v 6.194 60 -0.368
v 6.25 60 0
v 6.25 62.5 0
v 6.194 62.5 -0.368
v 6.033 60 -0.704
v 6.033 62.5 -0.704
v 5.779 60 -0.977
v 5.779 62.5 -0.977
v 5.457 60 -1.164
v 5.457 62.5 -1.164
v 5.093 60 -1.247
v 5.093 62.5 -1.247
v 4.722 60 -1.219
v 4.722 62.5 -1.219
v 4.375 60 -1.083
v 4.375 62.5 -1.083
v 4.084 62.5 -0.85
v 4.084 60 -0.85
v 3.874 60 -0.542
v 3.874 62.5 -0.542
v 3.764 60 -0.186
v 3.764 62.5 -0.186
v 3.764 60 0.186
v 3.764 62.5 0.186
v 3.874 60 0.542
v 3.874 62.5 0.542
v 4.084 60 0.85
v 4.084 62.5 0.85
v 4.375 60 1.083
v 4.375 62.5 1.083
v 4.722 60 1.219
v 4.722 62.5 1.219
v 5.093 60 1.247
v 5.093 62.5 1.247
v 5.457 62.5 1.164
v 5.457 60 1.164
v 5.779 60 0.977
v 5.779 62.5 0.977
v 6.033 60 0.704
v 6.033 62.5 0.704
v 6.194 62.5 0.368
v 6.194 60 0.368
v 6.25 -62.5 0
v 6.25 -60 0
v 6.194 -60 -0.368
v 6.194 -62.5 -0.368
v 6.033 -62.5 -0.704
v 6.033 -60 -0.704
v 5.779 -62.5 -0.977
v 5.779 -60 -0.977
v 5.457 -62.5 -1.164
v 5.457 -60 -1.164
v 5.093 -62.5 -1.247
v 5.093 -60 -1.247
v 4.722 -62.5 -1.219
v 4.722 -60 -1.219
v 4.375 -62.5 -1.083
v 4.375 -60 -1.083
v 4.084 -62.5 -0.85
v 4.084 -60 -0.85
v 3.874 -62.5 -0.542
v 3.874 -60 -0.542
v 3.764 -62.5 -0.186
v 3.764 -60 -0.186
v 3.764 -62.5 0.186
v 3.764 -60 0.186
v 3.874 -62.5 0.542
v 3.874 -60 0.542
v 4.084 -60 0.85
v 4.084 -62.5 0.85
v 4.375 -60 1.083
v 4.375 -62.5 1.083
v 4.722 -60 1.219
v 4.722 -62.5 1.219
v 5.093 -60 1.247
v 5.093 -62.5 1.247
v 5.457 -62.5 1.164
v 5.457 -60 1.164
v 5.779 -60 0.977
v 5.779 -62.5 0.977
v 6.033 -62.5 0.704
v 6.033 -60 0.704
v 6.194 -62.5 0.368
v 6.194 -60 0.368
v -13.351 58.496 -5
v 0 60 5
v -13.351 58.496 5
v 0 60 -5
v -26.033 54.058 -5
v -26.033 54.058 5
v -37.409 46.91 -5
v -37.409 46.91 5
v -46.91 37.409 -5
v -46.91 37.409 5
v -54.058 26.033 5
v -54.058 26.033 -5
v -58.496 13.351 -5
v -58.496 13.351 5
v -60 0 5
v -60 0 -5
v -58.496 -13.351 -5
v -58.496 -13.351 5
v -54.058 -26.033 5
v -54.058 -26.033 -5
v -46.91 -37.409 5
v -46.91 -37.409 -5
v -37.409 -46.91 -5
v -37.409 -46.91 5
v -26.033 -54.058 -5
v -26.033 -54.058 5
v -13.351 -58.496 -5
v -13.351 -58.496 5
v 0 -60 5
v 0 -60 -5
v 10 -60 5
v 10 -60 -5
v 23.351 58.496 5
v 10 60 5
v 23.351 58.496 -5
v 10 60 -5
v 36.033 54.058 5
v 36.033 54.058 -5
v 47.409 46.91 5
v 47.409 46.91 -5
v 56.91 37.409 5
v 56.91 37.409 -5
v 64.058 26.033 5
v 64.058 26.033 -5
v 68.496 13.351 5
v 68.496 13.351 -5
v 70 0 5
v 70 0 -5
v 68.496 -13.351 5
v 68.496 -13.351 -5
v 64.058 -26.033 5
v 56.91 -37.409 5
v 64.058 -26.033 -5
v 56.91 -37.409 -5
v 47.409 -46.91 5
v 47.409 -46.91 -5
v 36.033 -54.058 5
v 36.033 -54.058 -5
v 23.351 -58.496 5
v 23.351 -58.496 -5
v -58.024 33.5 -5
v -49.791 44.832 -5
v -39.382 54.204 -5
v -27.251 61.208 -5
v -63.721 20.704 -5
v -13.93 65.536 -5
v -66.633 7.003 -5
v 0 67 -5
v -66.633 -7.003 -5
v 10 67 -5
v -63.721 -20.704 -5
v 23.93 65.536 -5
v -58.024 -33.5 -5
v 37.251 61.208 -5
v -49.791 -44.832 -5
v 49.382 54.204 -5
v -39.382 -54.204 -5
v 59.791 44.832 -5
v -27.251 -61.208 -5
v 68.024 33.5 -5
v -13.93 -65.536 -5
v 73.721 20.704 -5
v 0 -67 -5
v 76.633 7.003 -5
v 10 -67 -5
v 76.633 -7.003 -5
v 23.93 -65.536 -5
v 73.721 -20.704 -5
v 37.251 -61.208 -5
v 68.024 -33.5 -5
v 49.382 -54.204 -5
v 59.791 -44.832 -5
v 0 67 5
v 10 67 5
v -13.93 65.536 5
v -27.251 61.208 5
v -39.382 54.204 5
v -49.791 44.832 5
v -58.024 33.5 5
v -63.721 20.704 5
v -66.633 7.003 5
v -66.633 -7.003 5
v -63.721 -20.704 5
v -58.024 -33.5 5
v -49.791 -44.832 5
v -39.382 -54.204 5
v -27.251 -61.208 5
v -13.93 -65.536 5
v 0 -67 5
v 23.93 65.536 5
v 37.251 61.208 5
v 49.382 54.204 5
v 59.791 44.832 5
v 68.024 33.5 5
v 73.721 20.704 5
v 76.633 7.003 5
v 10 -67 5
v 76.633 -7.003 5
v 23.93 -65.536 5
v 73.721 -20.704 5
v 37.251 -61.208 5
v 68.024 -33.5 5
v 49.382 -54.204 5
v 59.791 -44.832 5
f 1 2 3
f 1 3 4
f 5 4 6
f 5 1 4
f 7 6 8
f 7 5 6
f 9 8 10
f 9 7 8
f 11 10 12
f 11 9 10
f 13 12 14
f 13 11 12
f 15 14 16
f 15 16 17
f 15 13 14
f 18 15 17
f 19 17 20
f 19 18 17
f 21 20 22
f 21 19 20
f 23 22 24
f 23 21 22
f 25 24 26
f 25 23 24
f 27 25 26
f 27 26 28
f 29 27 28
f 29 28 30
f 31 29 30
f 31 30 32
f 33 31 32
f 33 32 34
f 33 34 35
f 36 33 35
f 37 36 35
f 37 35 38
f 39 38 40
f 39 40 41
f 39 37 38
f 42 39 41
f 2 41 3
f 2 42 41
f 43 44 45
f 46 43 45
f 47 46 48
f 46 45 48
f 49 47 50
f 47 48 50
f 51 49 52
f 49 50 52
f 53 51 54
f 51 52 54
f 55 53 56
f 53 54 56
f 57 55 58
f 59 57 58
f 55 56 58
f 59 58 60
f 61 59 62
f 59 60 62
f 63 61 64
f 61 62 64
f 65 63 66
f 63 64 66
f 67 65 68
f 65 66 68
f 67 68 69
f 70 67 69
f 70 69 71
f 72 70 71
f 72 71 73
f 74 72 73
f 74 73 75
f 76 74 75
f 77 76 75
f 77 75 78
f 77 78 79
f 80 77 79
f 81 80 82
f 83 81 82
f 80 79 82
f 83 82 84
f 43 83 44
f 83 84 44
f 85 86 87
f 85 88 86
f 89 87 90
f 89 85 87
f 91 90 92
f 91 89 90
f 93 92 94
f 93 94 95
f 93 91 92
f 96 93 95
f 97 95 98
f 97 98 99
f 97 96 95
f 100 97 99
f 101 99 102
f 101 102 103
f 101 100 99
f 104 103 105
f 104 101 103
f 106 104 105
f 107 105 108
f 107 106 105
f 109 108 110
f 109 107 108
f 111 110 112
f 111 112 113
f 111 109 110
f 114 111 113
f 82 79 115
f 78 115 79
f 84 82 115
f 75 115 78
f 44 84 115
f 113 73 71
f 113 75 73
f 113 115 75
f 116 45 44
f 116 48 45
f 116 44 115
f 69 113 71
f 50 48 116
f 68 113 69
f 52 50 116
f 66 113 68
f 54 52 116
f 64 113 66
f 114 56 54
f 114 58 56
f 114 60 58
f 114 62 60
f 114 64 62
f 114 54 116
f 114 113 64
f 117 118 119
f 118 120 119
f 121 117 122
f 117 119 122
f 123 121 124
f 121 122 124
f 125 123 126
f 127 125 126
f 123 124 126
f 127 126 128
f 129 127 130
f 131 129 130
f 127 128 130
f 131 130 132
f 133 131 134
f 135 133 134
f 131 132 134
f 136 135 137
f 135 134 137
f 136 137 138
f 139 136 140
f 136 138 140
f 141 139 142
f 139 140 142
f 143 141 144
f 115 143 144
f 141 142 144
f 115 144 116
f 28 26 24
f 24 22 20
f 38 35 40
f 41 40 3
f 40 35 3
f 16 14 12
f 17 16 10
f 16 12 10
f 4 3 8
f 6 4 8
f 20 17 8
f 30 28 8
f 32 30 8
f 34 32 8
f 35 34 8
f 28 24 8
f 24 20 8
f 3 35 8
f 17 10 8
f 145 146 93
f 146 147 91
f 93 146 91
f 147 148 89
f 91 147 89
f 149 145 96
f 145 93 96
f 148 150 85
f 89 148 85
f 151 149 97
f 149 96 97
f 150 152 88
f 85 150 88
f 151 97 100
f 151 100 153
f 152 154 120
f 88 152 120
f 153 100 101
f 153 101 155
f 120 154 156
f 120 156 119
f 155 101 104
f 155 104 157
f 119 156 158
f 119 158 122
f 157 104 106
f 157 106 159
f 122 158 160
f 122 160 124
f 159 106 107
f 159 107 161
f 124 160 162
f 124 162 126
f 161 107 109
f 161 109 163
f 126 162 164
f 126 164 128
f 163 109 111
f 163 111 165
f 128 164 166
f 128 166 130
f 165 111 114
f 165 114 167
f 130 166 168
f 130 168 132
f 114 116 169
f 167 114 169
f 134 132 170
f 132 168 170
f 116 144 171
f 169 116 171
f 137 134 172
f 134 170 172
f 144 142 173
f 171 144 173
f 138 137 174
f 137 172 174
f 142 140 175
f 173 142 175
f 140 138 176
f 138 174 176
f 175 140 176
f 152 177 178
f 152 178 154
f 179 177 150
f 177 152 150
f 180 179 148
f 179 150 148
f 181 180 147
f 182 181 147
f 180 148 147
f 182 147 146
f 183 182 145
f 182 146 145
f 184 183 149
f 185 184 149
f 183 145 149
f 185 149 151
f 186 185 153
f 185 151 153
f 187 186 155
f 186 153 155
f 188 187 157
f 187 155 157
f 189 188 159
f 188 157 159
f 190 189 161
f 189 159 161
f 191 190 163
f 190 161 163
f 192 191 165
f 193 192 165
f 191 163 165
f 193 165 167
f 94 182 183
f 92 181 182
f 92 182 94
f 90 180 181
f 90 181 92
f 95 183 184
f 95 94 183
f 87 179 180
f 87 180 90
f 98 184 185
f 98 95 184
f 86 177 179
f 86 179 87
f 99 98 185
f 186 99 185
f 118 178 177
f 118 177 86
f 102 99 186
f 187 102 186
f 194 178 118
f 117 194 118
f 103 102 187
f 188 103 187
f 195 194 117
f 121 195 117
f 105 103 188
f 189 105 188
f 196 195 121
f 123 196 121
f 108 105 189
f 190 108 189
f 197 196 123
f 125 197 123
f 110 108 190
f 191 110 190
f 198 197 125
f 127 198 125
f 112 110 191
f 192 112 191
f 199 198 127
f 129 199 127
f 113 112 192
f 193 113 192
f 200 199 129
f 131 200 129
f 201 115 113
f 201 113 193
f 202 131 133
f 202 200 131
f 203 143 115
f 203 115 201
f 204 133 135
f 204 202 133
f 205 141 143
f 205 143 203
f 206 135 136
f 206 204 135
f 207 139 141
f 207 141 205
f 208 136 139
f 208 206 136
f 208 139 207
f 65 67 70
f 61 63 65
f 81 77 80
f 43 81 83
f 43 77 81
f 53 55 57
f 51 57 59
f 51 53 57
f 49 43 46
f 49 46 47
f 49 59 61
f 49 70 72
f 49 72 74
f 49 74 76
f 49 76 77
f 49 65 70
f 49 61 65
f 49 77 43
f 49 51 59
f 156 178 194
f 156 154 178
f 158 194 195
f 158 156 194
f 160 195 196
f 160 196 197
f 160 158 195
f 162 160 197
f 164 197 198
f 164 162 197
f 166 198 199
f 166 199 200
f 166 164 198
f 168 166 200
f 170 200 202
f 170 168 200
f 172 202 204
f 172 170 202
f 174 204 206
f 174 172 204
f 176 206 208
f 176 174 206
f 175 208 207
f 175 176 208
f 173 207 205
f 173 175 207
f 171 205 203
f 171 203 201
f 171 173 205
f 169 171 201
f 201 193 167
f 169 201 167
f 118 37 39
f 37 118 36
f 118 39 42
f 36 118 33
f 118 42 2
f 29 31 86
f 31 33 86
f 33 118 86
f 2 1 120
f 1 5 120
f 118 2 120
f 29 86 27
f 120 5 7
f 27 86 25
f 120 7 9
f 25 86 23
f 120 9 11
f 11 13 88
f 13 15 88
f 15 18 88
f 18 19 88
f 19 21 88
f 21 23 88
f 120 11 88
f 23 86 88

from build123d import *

# Parameters (mm, degrees)
SKETCH1_W           = 10
SKETCH1_H           = 7
REVOLVE1_ANGLE      = 180
SKETCH2_W           = 10
SKETCH2_H           = 7
BOSS_EXTRUDE1_DEPTH = 10
SKETCH4_W           = 10
SKETCH4_H           = 7
REVOLVE3_ANGLE      = 180
SKETCH5_R           = 1.25
CUT_EXTRUDE1_DEPTH  = 2.5


with BuildPart() as part:
    # Sketch1 → Revolve1 (revolve)
    with BuildSketch(Plane(origin=(0, 0, 0), x_dir=(0, 0, -1), z_dir=(1, 0, 0))):
        with Locations((0, 63.5)):
            Rectangle(SKETCH1_W, SKETCH1_H)
    revolve(axis=Axis((0, 0, 29.874383247), (0, 0, 1)), revolution_arc=REVOLVE1_ANGLE)

    # Sketch2 → Boss-Extrude1 (add)
    with BuildSketch(Plane(origin=(0, 0, 0), x_dir=(0, 0, -1), z_dir=(1, 0, 0))):
        with Locations((0, 63.5)):
            Rectangle(SKETCH2_W, SKETCH2_H)
        with Locations((0, -63.5)):
            Rectangle(SKETCH2_W, SKETCH2_H)
    extrude(amount=BOSS_EXTRUDE1_DEPTH)

    # Sketch4 → Revolve3 (revolve)
    with BuildSketch(Plane(origin=(10, 0, 0), x_dir=(0, 0, -1), z_dir=(1, 0, 0))):
        with Locations((0, 63.5)):
            Rectangle(SKETCH4_W, SKETCH4_H)
    revolve(axis=Axis((10, 0, 23.347655249), (0, 0, -1)), revolution_arc=REVOLVE3_ANGLE)

    # Sketch5 → Cut-Extrude1 (cut)
    with BuildSketch(Plane(origin=(0, -60, 0), x_dir=(1, 0, 0), z_dir=(0, 1, 0))):
        with Locations((5, 0)):
            Circle(SKETCH5_R)
    cut_extrude1 = extrude(amount=-CUT_EXTRUDE1_DEPTH, mode=Mode.SUBTRACT)

    # Mirror1: Cut-Extrude1 across plane
    add(cut_extrude1.mirror(Plane.ZX), mode=Mode.SUBTRACT)


solid = part.part
